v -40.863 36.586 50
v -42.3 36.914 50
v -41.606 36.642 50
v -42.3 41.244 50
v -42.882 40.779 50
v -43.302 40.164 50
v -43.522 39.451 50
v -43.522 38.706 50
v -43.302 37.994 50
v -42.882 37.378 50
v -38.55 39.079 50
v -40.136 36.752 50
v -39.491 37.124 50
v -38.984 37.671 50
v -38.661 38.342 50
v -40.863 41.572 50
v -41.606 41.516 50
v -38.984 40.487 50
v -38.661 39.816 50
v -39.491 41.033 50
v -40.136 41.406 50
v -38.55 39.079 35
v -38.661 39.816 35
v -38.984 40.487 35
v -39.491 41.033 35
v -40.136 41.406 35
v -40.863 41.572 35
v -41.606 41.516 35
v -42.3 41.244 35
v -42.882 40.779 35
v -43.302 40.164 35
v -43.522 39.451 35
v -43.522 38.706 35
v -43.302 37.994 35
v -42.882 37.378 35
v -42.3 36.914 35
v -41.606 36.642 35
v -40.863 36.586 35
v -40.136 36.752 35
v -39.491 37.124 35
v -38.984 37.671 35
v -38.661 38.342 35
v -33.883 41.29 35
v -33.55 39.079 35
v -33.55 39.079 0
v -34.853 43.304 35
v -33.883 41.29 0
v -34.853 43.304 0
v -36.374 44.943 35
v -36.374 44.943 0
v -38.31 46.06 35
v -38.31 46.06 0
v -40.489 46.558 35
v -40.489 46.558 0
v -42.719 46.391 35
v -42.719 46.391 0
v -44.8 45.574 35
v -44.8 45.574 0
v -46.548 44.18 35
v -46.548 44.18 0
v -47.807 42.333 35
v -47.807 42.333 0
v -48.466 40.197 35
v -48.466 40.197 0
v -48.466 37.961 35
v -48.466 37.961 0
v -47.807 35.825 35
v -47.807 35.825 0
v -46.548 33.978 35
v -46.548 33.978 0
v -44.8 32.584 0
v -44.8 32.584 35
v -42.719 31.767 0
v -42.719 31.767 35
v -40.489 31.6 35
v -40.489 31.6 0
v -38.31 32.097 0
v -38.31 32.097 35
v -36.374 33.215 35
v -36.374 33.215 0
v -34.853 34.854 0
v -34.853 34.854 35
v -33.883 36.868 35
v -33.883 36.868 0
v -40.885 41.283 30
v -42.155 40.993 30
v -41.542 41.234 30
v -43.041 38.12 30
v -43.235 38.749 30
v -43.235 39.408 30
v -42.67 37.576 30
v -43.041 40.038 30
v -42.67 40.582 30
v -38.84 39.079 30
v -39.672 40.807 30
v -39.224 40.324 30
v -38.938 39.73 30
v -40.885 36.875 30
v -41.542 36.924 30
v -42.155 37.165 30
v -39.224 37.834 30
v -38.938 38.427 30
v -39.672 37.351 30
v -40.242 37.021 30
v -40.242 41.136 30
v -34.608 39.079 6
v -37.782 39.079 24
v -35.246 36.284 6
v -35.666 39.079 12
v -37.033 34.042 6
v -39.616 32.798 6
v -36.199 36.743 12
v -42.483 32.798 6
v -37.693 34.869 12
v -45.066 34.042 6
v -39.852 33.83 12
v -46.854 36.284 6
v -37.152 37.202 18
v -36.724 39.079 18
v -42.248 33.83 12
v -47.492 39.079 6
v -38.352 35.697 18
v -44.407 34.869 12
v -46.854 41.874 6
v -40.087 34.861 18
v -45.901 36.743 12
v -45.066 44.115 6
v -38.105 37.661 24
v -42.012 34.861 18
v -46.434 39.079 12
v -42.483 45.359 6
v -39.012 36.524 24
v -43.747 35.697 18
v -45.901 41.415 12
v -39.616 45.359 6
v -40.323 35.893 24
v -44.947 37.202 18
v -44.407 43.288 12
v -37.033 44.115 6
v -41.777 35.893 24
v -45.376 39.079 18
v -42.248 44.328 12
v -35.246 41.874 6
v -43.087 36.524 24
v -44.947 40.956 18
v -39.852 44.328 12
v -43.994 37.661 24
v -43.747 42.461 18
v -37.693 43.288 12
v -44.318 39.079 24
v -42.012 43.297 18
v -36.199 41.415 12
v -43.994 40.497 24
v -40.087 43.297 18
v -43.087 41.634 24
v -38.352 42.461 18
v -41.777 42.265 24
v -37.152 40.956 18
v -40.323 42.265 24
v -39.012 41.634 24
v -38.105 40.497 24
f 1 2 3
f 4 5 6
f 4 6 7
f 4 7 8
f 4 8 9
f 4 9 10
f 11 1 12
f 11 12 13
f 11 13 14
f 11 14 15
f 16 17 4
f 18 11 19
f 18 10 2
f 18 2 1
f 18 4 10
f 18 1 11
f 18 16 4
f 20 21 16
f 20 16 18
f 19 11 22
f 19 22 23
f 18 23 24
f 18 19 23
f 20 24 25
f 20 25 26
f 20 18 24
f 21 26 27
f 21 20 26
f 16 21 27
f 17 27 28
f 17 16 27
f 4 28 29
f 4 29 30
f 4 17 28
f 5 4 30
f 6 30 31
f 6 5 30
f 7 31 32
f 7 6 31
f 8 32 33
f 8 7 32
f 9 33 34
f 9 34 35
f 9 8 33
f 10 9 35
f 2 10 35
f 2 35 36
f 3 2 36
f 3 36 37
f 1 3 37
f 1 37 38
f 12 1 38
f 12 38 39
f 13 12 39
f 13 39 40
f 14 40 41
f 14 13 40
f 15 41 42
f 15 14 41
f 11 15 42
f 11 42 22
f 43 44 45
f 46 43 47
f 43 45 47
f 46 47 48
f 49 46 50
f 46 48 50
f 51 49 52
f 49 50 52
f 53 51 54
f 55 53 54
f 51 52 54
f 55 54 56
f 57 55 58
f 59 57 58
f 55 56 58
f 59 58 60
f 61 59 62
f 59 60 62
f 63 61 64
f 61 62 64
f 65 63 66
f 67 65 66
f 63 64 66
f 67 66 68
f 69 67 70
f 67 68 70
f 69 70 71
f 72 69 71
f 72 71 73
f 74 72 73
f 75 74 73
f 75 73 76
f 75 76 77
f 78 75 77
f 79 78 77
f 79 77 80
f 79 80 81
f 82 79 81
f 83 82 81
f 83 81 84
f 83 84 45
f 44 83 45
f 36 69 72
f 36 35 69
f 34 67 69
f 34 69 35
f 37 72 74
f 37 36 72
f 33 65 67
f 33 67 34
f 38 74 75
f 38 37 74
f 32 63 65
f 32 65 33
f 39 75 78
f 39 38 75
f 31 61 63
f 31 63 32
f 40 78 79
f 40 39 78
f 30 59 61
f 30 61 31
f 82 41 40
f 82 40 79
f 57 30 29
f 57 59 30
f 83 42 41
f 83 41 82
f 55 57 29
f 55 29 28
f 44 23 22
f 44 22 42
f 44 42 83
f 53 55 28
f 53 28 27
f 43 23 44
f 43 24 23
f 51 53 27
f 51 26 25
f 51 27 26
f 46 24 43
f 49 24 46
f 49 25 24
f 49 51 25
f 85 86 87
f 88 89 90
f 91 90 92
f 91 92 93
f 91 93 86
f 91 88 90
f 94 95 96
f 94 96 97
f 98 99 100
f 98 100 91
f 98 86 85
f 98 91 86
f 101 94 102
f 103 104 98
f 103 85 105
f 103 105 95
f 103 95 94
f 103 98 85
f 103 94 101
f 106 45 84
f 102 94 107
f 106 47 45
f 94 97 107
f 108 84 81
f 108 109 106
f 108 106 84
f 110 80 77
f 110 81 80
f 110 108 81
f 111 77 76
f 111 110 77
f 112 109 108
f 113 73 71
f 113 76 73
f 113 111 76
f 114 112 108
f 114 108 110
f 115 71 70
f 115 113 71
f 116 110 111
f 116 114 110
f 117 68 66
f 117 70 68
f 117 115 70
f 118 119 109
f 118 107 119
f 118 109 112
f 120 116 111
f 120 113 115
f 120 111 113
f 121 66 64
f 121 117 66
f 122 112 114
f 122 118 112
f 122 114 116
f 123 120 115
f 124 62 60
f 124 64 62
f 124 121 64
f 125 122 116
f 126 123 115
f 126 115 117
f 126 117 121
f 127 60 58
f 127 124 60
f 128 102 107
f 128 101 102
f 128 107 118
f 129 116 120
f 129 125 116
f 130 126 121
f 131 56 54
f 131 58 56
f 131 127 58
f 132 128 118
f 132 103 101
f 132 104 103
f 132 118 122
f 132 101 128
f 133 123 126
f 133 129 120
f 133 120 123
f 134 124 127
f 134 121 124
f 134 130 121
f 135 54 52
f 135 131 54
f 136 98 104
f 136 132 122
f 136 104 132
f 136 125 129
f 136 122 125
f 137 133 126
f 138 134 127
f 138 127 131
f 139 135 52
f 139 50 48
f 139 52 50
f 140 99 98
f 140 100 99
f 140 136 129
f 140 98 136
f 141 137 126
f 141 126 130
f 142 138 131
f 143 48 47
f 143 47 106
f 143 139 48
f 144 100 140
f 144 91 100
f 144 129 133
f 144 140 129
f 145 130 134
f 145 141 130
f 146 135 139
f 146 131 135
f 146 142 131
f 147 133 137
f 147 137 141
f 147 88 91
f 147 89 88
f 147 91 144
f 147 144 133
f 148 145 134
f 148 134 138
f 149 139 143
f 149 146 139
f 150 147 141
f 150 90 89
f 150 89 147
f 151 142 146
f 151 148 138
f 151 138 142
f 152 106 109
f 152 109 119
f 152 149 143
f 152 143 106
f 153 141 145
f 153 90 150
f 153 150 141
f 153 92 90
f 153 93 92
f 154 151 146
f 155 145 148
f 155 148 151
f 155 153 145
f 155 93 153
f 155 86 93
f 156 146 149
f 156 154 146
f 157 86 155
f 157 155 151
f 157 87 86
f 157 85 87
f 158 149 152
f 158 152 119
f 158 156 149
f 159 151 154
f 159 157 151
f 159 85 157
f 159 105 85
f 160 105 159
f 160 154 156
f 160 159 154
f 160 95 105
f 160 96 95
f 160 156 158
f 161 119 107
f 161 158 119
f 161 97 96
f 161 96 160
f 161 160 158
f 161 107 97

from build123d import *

# Parameters (mm, degrees)
F0_R     = 7.5
F1_DEPTH = 50
F2_R     = 7.5
F3_DEPTH = 30
F3_TAPER = 10
F4_R     = 7.5
F4_R_2   = 2.5
F5_DEPTH = 15


with BuildPart() as f1:
    # F0 (on Top) → F1 (new body)
    with BuildSketch(Plane.XY):
        with Locations((-41.049785912, 39.0788912773)):
            Circle(F0_R)
    extrude(amount=F1_DEPTH)

    # F2 (on face) → F3 (cut)
    with BuildSketch(Plane(origin=(0, 0, 0), x_dir=(1, 0, 0), z_dir=(0, 0, -1))):
        with Locations((-41.049785912, -39.0788912773)):
            Circle(F2_R)
    extrude(amount=-F3_DEPTH, taper=F3_TAPER, mode=Mode.SUBTRACT)

    # F4 (on face) → F5 (cut)
    with BuildSketch(Plane.XY.offset(50)):
        with Locations((-41.049785912, 39.0788912773)):
            Circle(F4_R)
        with Locations((-41.049785912, 39.0788912773)):
            Circle(F4_R_2, mode=Mode.SUBTRACT)
    extrude(amount=-F5_DEPTH, mode=Mode.SUBTRACT)


solid = f1.part
